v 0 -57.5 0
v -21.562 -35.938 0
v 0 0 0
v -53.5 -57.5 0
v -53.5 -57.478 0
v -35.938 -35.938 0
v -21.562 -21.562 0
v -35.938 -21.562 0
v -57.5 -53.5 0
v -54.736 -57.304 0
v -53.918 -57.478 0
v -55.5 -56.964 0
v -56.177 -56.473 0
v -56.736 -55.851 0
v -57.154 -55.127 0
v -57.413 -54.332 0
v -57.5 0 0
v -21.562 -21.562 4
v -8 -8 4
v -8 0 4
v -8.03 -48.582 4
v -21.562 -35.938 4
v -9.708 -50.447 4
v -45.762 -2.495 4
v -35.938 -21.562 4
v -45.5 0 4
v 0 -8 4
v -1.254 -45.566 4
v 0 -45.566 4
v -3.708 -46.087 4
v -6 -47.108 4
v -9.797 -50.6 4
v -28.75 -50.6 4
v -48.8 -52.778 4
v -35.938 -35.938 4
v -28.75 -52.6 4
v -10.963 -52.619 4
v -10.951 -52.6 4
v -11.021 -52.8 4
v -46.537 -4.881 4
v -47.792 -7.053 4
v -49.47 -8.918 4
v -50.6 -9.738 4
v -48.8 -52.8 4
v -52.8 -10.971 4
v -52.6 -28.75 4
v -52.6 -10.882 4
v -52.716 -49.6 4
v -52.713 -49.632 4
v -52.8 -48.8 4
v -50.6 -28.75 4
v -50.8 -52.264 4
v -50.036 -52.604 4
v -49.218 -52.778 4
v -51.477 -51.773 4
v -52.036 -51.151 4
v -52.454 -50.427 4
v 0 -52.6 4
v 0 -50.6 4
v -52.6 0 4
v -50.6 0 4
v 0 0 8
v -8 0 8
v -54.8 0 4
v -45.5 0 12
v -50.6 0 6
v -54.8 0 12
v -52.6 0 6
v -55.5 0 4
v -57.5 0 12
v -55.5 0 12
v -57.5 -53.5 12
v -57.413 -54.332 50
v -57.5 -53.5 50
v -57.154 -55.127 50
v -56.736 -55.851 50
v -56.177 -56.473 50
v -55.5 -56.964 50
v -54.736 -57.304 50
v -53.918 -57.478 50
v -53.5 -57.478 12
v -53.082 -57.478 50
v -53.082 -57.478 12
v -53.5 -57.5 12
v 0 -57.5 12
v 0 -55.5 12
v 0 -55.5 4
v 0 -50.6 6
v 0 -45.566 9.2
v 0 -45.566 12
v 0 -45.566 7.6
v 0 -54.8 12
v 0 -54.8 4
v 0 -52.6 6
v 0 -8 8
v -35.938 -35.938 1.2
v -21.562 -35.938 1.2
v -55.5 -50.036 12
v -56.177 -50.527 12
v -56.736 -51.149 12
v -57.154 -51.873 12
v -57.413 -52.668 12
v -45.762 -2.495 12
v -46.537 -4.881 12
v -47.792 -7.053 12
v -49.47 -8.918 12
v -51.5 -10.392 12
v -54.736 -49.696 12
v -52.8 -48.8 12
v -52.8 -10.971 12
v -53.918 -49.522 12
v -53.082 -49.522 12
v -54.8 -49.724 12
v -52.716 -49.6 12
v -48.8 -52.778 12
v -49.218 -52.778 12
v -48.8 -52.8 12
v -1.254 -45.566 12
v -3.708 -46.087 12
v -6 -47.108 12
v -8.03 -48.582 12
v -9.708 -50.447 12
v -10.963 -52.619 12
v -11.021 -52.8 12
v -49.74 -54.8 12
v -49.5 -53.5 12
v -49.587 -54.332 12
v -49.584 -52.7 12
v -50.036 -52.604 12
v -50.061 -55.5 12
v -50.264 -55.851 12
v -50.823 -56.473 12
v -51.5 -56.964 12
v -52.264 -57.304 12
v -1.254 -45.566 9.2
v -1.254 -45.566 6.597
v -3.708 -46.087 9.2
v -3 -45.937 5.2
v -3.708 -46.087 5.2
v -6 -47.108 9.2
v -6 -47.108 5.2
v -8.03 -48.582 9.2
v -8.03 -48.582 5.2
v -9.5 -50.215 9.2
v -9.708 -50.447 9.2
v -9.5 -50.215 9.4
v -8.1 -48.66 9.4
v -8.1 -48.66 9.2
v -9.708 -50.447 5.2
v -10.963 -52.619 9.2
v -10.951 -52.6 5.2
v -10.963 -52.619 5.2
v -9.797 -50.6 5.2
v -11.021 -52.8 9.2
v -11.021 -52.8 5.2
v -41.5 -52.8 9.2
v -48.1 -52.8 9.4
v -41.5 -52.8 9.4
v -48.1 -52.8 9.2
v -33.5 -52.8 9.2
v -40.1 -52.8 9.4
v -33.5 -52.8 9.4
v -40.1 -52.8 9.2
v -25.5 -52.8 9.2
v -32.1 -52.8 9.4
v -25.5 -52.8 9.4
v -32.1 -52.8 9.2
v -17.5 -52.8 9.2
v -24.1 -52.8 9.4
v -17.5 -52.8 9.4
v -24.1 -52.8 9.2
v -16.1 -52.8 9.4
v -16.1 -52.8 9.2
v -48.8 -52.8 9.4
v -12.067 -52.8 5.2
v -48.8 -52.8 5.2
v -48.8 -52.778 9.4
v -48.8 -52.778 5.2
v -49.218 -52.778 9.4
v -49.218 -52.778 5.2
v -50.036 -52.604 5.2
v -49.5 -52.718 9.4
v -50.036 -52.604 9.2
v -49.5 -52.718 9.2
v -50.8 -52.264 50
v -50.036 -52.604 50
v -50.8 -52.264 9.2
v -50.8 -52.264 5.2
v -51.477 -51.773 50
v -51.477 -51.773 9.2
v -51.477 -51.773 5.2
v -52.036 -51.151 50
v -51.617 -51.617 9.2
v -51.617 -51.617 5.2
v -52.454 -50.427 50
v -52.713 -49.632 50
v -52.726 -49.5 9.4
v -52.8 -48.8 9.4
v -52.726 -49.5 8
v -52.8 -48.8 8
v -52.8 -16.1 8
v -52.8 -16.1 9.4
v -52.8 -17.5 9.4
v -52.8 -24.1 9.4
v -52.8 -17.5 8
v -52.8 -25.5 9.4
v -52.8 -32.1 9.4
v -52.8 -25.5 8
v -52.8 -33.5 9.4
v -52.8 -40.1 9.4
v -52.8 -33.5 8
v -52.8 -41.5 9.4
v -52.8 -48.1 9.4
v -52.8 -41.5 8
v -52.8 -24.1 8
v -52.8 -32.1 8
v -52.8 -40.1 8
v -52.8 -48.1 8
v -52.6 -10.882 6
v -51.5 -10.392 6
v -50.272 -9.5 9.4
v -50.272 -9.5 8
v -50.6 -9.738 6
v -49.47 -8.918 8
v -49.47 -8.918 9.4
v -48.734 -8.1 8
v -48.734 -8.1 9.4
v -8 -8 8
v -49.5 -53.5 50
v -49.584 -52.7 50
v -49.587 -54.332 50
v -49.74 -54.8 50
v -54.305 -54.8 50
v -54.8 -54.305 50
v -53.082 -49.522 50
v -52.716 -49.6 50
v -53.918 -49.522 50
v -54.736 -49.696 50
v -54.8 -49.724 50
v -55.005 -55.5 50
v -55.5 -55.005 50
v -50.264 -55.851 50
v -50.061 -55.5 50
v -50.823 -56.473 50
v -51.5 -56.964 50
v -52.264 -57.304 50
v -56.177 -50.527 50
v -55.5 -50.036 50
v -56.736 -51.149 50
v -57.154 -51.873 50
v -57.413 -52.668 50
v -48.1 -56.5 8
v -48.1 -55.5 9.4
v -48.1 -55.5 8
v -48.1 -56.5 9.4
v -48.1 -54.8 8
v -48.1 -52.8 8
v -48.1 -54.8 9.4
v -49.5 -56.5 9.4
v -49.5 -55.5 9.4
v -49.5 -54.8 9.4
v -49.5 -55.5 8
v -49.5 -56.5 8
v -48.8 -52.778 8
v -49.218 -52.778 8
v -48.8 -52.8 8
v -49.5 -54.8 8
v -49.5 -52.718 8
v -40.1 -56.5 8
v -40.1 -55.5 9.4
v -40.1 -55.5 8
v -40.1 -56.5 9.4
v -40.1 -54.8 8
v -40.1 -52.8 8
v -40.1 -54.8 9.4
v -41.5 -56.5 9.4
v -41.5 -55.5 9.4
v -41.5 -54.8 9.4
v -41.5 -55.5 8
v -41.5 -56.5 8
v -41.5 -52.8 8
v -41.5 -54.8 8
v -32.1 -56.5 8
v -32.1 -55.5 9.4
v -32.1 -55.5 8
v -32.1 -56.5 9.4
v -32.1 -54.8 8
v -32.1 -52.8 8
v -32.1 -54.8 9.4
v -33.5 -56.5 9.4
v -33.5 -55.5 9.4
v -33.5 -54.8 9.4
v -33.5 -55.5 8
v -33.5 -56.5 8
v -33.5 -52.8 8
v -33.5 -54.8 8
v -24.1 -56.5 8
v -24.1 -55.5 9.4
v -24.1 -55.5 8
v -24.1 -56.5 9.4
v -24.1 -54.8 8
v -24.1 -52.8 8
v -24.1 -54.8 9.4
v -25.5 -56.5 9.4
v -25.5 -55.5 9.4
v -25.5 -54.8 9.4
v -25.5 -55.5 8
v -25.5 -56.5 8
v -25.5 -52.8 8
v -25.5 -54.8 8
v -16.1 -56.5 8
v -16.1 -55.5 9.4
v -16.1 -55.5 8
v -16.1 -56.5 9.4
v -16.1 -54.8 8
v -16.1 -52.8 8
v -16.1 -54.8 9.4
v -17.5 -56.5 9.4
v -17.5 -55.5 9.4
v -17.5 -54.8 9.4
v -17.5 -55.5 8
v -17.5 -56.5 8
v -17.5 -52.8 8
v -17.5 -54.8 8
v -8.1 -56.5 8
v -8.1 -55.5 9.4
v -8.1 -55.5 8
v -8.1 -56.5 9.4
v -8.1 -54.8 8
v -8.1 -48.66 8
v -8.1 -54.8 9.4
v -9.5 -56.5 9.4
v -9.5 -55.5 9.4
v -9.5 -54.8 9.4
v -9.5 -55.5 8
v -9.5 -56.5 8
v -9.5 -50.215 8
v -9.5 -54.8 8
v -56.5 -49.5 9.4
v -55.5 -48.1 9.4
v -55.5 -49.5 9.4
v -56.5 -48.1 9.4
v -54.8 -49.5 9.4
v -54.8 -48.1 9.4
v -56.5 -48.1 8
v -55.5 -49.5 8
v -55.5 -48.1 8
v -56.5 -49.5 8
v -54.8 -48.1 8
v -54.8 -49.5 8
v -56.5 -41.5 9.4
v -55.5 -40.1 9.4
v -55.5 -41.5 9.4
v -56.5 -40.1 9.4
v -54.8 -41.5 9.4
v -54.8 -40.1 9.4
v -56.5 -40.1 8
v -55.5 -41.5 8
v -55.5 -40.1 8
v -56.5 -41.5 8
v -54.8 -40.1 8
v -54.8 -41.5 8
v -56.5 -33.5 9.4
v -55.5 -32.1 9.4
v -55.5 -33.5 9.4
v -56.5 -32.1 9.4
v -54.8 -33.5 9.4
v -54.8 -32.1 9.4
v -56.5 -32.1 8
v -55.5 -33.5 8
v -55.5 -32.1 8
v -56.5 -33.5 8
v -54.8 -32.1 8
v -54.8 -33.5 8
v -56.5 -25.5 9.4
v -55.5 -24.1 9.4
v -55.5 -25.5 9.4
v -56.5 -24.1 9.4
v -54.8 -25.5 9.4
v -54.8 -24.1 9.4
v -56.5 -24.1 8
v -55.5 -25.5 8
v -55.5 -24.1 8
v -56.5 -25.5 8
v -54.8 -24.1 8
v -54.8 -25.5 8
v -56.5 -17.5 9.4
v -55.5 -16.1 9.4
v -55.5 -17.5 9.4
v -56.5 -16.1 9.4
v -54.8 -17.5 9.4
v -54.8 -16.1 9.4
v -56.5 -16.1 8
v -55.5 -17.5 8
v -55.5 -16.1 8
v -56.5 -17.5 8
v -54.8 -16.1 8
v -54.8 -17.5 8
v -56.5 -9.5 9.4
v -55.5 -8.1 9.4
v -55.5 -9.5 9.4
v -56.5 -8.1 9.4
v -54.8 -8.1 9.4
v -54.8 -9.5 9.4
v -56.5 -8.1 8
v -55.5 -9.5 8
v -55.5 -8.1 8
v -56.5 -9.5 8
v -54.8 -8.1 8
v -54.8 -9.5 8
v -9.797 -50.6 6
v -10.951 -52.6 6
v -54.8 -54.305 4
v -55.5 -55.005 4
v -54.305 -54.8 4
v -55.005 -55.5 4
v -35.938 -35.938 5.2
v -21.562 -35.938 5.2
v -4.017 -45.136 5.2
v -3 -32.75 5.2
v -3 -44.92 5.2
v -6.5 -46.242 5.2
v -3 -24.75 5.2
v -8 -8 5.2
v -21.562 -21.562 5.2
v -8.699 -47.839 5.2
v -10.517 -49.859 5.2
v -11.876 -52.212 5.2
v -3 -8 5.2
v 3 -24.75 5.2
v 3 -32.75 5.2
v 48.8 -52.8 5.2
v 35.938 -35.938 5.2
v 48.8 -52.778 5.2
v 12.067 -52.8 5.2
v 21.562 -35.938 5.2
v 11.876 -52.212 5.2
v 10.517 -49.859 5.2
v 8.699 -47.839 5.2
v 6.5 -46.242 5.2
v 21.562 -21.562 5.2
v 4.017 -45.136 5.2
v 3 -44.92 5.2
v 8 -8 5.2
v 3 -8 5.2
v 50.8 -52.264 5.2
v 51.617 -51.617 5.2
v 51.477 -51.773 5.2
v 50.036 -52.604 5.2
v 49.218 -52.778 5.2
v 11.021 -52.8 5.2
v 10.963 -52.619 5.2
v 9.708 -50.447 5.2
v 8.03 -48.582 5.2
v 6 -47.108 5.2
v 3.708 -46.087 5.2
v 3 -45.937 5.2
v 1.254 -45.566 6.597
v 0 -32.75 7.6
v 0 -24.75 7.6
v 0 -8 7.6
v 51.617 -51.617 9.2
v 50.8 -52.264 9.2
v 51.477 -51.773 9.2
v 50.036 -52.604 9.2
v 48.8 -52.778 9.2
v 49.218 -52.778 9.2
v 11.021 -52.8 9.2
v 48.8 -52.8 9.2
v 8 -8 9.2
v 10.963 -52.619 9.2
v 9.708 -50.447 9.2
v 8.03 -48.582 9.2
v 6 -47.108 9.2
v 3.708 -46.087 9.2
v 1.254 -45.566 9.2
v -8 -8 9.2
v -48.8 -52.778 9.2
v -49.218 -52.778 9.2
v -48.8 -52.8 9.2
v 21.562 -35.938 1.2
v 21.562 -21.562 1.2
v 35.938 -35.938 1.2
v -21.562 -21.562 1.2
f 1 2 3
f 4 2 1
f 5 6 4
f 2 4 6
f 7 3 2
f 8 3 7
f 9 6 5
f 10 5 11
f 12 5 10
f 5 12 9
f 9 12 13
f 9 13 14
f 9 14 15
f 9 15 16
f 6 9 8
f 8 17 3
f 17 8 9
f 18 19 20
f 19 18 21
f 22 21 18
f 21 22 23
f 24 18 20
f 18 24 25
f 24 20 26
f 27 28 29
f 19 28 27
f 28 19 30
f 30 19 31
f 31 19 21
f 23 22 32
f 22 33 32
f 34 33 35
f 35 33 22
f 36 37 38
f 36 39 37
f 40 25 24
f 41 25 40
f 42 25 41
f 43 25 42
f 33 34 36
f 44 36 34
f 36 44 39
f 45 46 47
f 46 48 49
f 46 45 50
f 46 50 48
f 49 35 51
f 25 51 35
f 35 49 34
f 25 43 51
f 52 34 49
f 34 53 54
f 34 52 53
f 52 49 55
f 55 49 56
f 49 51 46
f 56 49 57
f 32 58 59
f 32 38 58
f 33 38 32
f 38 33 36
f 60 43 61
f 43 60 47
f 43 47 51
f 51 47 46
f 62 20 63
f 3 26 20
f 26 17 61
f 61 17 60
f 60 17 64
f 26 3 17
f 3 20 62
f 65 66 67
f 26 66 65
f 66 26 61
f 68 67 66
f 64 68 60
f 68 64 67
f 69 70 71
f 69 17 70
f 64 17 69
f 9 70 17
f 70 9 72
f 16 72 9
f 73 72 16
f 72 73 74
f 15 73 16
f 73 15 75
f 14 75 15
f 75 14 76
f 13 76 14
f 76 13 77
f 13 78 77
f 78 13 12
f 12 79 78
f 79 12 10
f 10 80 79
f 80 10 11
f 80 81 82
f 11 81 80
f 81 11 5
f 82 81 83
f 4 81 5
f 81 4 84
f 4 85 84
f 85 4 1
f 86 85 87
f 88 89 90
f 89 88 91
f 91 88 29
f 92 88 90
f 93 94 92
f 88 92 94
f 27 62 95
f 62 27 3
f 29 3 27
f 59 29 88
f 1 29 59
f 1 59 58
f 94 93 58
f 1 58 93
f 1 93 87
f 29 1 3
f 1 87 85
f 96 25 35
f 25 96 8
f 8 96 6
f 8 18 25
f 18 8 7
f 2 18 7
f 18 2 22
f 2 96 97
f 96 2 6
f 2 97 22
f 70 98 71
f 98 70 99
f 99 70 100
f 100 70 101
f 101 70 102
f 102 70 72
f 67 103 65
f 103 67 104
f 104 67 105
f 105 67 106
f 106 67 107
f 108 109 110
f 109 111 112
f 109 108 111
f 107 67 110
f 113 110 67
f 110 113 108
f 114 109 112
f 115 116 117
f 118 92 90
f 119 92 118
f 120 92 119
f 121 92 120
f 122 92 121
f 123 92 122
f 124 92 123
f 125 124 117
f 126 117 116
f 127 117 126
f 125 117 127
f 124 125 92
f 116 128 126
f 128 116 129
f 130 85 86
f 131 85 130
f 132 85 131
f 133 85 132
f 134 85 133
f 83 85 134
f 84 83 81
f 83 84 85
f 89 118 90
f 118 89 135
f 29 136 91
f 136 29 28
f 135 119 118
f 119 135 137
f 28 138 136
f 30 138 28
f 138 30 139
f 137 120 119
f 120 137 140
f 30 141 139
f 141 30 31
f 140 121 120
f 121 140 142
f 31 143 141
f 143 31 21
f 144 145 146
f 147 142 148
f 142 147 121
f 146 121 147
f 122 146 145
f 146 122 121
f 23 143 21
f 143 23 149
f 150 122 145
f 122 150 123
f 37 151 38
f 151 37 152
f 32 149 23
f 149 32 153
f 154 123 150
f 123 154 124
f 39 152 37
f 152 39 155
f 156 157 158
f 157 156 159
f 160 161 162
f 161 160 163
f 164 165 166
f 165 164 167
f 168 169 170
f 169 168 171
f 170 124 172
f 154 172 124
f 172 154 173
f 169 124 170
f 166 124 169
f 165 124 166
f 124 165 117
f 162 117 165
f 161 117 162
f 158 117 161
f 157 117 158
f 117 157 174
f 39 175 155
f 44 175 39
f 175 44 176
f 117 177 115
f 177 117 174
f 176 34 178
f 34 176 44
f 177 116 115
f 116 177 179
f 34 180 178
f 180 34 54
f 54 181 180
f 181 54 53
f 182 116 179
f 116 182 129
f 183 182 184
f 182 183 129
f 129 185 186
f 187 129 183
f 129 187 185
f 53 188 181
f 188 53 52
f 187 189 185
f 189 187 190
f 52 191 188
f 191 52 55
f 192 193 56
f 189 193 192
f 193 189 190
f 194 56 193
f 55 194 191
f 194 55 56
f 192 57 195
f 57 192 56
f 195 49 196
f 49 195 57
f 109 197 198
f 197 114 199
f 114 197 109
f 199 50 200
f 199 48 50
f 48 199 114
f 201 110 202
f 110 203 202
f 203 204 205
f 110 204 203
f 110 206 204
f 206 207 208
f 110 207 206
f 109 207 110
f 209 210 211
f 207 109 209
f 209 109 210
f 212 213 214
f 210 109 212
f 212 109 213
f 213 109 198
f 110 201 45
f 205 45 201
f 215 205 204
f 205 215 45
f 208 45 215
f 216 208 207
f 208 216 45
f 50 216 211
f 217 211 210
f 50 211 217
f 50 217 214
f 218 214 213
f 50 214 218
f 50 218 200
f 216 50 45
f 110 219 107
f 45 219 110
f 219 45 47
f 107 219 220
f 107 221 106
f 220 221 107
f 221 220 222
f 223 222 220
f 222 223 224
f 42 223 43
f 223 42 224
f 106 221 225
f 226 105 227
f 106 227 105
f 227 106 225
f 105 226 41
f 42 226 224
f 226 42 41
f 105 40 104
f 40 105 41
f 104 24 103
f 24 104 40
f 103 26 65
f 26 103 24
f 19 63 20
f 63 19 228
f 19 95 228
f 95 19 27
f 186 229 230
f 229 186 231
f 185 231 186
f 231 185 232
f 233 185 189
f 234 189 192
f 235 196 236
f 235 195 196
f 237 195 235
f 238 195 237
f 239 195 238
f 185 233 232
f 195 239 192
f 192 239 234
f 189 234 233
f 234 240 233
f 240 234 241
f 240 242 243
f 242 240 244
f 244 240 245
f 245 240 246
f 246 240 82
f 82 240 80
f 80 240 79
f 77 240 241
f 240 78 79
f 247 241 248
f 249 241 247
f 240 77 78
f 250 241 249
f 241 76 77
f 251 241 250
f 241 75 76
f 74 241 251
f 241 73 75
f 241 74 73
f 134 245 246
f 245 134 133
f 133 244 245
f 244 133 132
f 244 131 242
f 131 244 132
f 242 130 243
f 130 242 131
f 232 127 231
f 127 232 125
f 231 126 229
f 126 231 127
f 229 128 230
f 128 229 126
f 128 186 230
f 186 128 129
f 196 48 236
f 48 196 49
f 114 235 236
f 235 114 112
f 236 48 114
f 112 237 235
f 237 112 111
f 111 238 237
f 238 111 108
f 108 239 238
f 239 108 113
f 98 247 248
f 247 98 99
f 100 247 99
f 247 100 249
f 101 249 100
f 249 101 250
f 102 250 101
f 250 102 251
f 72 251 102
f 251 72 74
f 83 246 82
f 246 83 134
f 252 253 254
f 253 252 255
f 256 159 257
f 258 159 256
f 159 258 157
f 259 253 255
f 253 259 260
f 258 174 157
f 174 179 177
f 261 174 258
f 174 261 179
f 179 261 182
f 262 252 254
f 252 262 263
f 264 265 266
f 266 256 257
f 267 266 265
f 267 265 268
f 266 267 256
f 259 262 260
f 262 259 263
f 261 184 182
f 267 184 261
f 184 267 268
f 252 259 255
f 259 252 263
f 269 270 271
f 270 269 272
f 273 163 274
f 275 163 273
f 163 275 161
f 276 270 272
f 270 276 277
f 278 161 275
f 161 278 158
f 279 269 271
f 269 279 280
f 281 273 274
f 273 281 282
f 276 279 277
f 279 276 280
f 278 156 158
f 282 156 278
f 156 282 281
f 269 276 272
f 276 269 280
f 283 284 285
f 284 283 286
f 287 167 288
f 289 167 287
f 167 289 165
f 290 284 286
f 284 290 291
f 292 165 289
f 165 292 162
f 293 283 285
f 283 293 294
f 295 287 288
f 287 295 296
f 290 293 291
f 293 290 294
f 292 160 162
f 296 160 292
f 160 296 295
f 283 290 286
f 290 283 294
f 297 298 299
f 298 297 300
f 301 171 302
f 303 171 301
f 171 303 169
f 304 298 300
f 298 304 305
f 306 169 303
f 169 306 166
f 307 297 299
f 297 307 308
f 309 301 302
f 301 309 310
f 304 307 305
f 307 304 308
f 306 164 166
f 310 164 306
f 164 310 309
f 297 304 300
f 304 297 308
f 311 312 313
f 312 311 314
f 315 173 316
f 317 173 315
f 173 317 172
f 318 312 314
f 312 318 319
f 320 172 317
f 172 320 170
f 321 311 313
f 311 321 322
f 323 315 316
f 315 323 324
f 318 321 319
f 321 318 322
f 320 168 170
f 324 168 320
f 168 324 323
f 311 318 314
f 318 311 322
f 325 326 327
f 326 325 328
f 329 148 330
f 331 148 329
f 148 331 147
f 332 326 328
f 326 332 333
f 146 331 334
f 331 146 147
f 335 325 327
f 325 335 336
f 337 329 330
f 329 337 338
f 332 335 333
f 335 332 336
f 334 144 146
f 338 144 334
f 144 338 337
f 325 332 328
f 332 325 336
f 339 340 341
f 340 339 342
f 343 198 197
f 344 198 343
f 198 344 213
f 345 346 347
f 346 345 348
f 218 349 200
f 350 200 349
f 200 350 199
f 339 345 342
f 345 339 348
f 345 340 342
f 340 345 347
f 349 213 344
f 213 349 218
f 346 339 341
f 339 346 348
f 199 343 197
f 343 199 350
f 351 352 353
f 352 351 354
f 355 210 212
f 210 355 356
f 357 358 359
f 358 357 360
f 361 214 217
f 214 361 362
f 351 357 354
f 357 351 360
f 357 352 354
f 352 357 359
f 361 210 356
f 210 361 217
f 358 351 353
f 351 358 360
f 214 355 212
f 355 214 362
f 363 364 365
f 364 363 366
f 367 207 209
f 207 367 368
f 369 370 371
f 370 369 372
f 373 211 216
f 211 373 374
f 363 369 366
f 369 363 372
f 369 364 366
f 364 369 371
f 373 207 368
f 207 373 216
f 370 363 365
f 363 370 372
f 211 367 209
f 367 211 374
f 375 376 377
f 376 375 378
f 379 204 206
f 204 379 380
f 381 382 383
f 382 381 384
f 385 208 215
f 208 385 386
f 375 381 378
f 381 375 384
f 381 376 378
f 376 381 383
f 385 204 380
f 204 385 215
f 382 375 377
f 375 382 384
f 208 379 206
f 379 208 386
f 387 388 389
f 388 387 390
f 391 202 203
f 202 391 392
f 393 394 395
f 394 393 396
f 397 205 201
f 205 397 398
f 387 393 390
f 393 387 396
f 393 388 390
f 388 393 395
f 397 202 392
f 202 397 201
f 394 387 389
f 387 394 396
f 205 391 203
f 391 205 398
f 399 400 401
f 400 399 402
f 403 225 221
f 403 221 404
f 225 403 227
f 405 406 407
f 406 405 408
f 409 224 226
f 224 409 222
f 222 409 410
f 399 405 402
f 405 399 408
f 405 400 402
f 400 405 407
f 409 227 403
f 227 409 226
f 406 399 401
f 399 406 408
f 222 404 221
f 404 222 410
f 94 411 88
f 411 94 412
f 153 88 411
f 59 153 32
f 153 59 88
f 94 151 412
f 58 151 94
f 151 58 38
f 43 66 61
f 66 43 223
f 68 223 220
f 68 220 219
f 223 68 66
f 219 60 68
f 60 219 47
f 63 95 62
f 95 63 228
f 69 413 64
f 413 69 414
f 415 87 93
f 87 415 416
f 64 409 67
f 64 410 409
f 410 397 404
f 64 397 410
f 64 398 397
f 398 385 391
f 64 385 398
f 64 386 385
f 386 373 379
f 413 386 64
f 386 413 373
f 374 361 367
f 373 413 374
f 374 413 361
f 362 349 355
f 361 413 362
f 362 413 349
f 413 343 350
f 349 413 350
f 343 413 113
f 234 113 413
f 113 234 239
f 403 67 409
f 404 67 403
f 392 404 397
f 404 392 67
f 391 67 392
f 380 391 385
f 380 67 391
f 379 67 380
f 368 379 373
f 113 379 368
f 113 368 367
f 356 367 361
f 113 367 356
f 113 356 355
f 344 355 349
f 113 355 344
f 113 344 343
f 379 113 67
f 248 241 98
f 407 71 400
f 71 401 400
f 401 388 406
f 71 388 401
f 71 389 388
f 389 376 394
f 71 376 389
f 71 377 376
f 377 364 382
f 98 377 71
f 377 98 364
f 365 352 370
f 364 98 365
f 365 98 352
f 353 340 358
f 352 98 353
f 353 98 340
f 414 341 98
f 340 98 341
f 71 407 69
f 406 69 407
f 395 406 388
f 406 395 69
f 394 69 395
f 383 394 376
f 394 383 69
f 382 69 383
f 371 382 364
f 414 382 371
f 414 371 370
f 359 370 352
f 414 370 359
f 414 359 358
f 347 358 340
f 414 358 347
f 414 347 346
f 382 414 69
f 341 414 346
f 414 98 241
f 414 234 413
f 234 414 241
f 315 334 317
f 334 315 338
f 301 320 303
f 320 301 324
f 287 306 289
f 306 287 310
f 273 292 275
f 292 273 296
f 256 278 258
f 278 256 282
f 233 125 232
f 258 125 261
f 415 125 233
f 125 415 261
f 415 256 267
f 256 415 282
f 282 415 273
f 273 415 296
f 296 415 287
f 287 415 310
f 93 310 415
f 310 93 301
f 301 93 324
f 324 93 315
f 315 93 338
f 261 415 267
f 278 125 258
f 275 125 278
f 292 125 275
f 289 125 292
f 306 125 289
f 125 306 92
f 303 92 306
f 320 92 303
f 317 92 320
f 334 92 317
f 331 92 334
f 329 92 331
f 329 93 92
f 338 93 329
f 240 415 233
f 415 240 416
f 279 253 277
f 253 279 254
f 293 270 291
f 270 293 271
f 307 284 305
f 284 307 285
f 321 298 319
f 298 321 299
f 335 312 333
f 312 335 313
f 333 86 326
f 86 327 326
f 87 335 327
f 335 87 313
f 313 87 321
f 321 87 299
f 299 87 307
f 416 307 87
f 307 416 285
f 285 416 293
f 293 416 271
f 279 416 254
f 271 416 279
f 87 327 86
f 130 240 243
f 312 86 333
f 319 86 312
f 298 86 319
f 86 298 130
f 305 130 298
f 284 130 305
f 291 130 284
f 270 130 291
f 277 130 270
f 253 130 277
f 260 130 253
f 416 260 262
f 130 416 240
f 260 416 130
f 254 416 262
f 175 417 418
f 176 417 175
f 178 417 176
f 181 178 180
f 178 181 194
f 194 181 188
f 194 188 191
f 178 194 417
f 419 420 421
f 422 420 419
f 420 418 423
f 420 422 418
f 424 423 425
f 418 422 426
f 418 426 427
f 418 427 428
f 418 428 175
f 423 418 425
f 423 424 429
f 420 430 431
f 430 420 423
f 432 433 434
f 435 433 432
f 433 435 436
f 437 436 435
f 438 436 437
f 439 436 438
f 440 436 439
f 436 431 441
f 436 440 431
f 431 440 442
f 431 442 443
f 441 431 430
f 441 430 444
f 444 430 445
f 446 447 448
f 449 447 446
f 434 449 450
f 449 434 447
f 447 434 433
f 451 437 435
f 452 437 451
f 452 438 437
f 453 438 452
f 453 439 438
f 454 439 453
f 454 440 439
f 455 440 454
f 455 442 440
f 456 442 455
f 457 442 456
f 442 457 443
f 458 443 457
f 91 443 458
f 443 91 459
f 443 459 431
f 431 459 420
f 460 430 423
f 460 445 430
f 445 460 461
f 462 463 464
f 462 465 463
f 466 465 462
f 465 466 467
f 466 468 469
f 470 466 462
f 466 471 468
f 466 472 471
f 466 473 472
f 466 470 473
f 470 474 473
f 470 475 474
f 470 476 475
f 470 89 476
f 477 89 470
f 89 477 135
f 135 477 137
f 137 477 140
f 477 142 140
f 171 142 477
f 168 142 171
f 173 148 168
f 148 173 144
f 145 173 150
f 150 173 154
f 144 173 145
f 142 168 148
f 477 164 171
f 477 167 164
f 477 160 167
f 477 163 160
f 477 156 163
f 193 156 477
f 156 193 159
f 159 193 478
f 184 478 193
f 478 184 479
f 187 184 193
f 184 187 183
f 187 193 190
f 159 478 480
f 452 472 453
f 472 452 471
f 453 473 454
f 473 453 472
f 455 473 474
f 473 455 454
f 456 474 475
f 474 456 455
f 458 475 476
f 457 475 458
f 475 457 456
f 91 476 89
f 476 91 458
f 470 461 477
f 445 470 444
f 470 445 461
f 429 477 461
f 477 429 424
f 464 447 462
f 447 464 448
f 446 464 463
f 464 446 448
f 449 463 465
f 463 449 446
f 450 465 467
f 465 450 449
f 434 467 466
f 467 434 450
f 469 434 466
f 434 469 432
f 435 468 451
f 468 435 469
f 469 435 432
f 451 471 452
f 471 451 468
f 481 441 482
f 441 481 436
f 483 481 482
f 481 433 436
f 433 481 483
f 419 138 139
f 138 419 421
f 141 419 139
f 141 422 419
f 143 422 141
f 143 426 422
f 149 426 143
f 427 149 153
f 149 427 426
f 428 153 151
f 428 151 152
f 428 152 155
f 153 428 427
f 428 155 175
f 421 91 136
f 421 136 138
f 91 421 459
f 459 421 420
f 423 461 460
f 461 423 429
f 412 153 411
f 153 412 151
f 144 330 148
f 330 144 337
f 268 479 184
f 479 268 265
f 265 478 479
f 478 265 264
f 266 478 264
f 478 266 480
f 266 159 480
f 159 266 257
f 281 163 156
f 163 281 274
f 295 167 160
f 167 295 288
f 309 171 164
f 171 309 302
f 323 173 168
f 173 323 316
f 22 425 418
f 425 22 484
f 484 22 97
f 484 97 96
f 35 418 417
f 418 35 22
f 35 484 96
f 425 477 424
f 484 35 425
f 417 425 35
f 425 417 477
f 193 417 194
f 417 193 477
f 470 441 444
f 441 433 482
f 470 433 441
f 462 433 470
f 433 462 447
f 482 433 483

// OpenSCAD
//
//  Copyright (C) 19-06-2013 Jasper den Ouden.(ojasper.nl)
//
//  This is free software: you can redistribute it and/or modify
//  it under the terms of the GNU General Public License as published
//  by the Free Software Foundation, either version 3 of the License, or
//  (at your option) any later version.
//

$fs=0.5;
t = 4;
w = 115;

pt=0.7;
wr=1;

h=150;

//TODO plate space, corners and top.

module quarter2d()
{   union()
    {   translate([t,t]) circle(t);
        translate([t,0]) square([w/2-t,w/2]);
        translate([0,t]) square([w/2,w/2-t]);
    }
}

module floor_sub()
{
    difference()
    {   intersection()
        {   quarter2d();
            translate([t+pt,t+pt]) quarter2d();
        }
        translate([w/2,0]) circle(3*t);
        translate([0,w/2]) circle(3*t);
        translate([w/2-2*t,w/2-2*t]) square(3*[t,t]);
    }
}

module bottom_section()
{
    difference()
    {   union()
        {   linear_extrude(height=t) difference() //With hole for floor.
            { quarter2d(); translate(1.5*[w,w]/8) square([w,w]/8); }
            linear_extrude(height=3*t) difference()
            {   quarter2d();
                floor_sub();
            }
            linear_extrude(height=h/3) difference()
            {   translate([t,t]) circle(t);
                translate([2*t+pt,2*t+pt]) circle(t);
            }
        }
        translate([w/2,t+pt+1.2*wr,t+wr]) cube([w/2,2*wr,2*wr],center=true);
        translate([t+pt+1.2*wr,w/2,t+wr]) cube([2*wr,w/2,2*wr],center=true);
        
        //Cuts off top of center pip.
        translate([w/2,w/2,w+2*t]) cube([w/2,w/2,2*w],center=true);
        
        translate([0,0,t]) linear_extrude(height=h) difference()
        {   union()
            {   translate([t/2,t/2]) square([pt,w]);
                translate([t/2,t/2]) square([w,pt]);
            }
            rotate(-45) square([pt,w],center=true);
        }
        for( x = [ 2*t : 2*t : w/2-2*t] ) translate([x,t/4,2*t]) cube(2*[pt,t,pt]);
        for( y = [ 2*t : 2*t : w/2-2*t] ) translate([t/4,y,2*t]) cube(2*[t,pt,pt]);
    }
}

module corner_section(h=h/3)
{
    translate([0,0,t]) linear_extrude(height=h) difference()
    {   translate([t,t]) circle(t);
        translate([2*t+pt,2*t+pt]) circle(t);        
        difference()
        {   union()
            {   translate([t/2,t/2]) square([pt,w]);
                translate([t/2,t/2]) square([w,pt]);
            }
            rotate(-45) square([pt,w],center=true);
        }
    }
}
//corner_section();
//bottom_section();
module _floor_section()
{
    difference()
    {   linear_extrude(height=t) floor_sub();
        translate([w/2,w/2,2*t]) 
            for(a=[-90,0]) rotate(a) union()
            {   rotate([90,0,0]) translate([0,0,w/4+t]) scale([1,0.8])
                    cylinder(r=2*t,h=w, $fn=4);
                rotate([90,0,0]) scale([1,0.8]) cylinder(r=2*t,h=w/4-t, $fn=4);
                translate([0,-w/2,-t]) cylinder(r=3*t+wr,h=t);
            }
        
    }
    translate(1.5*[w,w]/8) cube([w/8,w/8,2*t]);
}

module floor_section()
{
    intersection()
    {   rotate(135) union()
        {   translate([-w/2,-w/2]) _floor_section();
            scale([-1,1,1]) translate([-w/2,-w/2]) _floor_section();
        }
        difference()
        {   cube([w,w,h]);
            cylinder(r2=3.6*t,r1=0, h=2*t, $fn=4);
        }
    }
}

//translate([w,0]) floor_section();

module as_assembled()
{
    translate(-[w/2,w/2]) bottom_section();
    color([0.6,0.6,1]) for( a=[0] )
        rotate(a-45) translate([0,0,2.3*t]) rotate([180,0]) floor_section();
}

as_assembled();
